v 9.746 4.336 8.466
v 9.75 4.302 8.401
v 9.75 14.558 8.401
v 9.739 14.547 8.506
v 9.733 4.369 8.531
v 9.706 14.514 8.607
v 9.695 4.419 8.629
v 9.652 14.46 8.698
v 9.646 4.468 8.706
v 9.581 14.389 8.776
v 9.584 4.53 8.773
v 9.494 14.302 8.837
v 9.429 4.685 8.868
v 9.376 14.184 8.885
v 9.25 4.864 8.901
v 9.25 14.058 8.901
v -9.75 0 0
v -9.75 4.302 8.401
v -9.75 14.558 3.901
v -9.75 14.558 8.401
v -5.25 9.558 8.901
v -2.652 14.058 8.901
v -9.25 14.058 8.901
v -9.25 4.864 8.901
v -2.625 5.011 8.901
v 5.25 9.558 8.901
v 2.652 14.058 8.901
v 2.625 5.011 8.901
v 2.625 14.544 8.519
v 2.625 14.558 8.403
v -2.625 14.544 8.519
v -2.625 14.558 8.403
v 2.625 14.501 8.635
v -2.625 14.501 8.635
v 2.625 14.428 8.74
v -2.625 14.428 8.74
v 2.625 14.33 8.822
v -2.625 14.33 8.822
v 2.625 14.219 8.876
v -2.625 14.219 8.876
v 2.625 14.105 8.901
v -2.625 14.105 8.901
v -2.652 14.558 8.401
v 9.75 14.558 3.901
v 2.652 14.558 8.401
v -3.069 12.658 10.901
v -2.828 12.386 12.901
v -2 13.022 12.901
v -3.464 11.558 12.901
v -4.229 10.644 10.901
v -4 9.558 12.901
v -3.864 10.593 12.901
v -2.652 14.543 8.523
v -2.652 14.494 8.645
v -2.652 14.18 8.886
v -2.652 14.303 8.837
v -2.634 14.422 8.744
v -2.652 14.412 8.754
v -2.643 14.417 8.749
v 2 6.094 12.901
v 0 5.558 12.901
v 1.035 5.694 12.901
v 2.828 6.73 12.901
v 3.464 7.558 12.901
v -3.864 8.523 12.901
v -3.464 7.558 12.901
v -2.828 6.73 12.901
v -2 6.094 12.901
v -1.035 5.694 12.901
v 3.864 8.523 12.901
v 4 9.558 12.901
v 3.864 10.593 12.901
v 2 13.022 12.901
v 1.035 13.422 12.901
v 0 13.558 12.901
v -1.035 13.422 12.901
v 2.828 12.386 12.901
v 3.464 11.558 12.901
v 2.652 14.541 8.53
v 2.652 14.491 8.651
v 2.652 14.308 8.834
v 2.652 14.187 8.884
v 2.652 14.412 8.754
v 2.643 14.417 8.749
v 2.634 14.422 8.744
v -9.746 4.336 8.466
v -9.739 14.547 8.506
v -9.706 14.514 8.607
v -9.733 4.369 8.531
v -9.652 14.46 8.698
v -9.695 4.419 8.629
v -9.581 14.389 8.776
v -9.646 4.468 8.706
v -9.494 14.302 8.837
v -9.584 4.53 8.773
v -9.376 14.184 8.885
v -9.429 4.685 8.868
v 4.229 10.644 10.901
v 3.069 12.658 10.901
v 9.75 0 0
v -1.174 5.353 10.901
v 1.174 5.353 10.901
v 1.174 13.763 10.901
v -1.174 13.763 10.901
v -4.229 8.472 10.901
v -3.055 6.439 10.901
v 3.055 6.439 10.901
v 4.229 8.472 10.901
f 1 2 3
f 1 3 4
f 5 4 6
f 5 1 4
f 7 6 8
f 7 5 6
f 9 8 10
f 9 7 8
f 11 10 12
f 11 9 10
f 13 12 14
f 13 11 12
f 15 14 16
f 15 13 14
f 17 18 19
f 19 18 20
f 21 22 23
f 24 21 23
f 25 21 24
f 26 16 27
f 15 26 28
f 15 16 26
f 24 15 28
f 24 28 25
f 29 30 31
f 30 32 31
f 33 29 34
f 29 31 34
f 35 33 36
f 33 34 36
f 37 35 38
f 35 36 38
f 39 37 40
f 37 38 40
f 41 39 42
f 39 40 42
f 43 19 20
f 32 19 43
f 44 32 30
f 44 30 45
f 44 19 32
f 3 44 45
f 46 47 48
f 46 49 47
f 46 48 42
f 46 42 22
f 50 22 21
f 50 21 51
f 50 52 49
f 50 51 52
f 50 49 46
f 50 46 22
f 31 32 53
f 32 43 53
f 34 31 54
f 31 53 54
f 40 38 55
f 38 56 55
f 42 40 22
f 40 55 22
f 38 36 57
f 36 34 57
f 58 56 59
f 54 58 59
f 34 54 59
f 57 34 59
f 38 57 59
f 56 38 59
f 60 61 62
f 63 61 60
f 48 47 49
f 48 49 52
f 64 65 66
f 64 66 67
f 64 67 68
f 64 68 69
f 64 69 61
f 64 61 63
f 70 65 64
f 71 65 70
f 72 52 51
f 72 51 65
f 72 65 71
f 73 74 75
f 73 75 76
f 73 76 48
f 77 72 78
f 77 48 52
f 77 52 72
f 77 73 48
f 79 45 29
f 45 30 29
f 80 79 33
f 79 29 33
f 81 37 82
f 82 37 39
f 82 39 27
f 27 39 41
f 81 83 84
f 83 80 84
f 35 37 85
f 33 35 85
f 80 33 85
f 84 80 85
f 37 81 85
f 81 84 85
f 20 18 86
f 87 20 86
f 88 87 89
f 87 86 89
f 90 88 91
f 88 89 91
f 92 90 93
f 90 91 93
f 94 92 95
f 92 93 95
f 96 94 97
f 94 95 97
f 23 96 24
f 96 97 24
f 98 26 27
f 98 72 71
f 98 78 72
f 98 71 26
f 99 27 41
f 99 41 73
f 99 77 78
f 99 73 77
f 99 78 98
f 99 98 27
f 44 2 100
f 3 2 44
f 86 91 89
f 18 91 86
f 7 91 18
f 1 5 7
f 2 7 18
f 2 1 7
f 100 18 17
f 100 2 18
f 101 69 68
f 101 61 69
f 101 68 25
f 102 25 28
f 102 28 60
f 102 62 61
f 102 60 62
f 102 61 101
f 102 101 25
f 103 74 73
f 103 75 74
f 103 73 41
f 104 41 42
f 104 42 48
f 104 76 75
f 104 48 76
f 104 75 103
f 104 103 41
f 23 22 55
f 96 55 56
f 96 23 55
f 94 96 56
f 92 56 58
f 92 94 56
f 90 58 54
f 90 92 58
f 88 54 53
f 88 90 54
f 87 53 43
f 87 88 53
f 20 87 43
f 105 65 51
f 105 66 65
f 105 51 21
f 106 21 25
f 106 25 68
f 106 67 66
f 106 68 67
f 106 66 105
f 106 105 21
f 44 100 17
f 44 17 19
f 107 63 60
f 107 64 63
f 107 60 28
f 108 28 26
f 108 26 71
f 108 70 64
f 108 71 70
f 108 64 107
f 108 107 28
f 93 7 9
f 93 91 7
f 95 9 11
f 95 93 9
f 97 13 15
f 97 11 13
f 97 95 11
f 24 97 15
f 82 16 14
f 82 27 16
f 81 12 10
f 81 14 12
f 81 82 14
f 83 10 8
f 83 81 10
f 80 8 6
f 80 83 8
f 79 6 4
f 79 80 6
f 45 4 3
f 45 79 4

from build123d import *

# Parameters (mm, degrees)
F1_DEPTH = 9.75
F4_R     = 4
F6_R     = 0.5


with BuildPart() as f1:
    # F0 (on Right) → F1 (new body, symmetric)
    with BuildSketch(Plane.YZ):
        Polygon((4.5580229037, 8.9008104805), (0, 0), (14.5580229037, 3.9008104805), (14.5580229037, 8.9008104805), align=None)
    extrude(amount=F1_DEPTH, both=True)

    # F2 (on face) → F5 section 0
    with BuildSketch(Plane.XY.offset(8.9008104805)):
        Polygon((2.625, 14.1046562736), (-2.625, 14.1046562736), (-5.25, 9.5580229037), (-2.625, 5.0113895339), (2.625, 5.0113895339), (5.25, 9.5580229037), align=None)
    # F4 (on offset) → F5 section 1
    with BuildSketch(Plane.XY.offset(12.9008104805)):
        with Locations((0, 9.5580229037)):
            Circle(F4_R)
    loft()

    # F6
    f6_edges = [f1.edges().sort_by_distance(p)[0] for p in [
        (-9.75, 9.558023, 8.90081),
        (0, 4.558023, 8.90081),
        (9.75, 9.558023, 8.90081),
        (0, 14.558023, 8.90081),
    ]]
    fillet(f6_edges, radius=F6_R)


solid = f1.part
